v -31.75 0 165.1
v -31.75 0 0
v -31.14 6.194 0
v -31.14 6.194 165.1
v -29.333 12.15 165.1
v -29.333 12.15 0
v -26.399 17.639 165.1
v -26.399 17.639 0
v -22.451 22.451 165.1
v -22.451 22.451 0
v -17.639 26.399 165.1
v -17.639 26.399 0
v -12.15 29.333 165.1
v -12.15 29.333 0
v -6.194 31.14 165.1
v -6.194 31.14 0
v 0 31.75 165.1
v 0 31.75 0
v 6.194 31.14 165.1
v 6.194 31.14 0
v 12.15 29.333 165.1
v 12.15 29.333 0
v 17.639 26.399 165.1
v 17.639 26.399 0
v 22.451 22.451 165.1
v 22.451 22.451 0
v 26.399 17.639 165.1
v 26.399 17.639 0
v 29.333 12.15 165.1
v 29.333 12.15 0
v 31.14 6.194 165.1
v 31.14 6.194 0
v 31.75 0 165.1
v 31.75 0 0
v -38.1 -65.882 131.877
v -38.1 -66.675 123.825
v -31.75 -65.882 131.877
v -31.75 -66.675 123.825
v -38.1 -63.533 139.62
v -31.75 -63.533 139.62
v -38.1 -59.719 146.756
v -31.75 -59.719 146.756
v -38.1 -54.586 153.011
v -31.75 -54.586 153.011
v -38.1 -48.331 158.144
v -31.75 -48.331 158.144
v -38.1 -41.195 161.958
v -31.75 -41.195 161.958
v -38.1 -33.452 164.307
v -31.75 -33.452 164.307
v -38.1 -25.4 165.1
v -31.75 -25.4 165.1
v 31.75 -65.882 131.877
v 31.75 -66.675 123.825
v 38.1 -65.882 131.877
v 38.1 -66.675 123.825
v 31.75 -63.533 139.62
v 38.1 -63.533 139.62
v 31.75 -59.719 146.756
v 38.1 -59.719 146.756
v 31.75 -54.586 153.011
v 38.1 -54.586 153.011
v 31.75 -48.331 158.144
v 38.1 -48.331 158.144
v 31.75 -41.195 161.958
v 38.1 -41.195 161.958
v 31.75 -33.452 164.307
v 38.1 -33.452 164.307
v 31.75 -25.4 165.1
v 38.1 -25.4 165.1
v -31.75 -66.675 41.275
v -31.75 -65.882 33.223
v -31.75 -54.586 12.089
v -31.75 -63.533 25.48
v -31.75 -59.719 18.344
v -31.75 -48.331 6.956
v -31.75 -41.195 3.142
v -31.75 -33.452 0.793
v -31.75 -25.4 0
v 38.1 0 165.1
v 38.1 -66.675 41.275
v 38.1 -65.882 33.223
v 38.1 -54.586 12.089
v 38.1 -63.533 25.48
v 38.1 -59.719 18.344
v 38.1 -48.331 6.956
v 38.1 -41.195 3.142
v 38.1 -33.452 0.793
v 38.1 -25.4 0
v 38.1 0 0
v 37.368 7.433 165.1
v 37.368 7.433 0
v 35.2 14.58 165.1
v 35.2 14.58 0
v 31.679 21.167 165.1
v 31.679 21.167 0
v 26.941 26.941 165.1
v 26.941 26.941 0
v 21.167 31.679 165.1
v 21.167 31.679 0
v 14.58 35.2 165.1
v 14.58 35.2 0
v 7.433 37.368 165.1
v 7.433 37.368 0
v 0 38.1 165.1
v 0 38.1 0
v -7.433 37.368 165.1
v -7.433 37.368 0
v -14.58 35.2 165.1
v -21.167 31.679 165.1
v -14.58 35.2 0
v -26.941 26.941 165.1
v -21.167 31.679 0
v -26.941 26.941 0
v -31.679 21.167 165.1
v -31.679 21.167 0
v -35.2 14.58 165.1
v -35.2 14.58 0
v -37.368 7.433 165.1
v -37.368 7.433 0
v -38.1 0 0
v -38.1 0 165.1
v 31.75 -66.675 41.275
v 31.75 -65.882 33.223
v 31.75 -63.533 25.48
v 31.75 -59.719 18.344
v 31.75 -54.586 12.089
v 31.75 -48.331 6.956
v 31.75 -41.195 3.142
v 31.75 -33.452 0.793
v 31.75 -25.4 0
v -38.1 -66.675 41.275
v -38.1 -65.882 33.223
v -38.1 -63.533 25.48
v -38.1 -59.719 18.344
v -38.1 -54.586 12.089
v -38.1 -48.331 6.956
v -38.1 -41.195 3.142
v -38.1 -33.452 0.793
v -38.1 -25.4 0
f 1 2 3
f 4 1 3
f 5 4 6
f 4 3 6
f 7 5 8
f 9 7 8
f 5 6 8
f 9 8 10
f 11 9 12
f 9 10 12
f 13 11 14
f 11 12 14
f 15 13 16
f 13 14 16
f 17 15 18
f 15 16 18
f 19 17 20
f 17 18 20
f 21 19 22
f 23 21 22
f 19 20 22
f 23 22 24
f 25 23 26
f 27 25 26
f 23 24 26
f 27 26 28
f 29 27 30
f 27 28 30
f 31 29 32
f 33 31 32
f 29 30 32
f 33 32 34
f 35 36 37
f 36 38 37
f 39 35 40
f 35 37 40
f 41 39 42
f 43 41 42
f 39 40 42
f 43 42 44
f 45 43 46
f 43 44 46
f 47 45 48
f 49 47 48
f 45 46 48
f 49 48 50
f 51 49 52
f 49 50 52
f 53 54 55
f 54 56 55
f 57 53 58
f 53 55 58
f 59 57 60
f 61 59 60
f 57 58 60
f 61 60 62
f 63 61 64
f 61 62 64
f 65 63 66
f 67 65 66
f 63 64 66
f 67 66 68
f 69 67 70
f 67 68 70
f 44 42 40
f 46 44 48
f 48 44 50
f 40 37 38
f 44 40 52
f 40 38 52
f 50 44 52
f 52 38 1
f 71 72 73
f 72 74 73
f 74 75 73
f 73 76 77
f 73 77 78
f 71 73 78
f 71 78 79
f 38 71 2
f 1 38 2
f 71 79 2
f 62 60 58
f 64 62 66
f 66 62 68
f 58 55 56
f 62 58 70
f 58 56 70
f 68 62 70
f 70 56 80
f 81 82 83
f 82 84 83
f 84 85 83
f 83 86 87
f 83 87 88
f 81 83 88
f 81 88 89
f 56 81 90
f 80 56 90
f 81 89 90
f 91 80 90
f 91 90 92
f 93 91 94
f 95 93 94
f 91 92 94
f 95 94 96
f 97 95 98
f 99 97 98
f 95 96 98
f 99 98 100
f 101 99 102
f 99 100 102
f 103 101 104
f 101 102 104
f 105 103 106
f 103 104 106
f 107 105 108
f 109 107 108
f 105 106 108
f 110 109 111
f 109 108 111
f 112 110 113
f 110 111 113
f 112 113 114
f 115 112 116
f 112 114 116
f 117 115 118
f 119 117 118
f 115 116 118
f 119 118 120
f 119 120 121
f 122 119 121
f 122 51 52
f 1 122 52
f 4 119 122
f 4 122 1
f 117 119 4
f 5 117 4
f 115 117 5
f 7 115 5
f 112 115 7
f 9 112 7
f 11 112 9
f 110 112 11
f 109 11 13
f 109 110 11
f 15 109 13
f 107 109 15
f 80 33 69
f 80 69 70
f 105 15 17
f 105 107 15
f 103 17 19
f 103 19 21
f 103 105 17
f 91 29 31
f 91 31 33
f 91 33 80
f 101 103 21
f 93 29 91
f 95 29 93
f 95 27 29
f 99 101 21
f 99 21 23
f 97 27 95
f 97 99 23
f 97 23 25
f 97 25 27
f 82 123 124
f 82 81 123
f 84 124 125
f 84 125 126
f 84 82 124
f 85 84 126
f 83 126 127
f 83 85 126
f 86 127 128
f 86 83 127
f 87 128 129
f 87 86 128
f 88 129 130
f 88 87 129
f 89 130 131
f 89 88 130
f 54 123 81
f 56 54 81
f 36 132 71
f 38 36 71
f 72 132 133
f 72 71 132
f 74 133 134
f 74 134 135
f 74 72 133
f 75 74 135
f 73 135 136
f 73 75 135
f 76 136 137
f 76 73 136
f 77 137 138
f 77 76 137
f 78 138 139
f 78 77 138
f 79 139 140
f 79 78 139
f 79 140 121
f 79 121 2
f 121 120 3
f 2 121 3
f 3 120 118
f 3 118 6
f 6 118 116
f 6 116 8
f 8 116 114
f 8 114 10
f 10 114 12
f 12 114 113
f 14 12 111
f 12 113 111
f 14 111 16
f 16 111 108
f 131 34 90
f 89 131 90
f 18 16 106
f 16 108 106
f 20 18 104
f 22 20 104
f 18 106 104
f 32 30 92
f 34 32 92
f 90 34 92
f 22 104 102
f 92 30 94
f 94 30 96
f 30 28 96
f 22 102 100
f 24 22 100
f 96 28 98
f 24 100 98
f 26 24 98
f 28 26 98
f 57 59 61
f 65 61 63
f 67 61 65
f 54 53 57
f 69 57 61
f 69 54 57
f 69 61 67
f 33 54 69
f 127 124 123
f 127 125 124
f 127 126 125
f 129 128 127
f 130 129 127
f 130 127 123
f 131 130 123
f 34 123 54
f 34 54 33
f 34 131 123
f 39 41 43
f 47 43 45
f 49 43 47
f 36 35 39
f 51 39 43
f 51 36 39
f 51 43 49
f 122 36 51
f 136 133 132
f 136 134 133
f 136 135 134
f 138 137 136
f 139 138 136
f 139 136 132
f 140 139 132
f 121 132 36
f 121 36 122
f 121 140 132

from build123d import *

# Parameters (mm, degrees)
F0_W     = 6.35
F0_H     = 66.675
F1_DEPTH = 165.1
F2_R     = 41.275


with BuildPart() as f1:
    # F0 (on Top) → F1 (new body)
    with BuildSketch(Plane.XY):
        with BuildLine():
            Line((31.75, 0), (38.1, 0))
            ThreePointArc((38.1, 0), (0, 38.1), (-38.1, 0))
            Line((-38.1, 0), (-31.75, 0))
            ThreePointArc((-31.75, 0), (0, 31.75), (31.75, 0))
        make_face()
        with Locations((-34.925, -33.3375)):
            Rectangle(F0_W, F0_H)
        with Locations((34.925, -33.3375)):
            Rectangle(F0_W, F0_H)
    extrude(amount=F1_DEPTH)

    # F2
    f2_edges = [f1.edges().sort_by_distance(p)[0] for p in [
        (-34.925, -66.675, 165.1),
        (34.925, -66.675, 165.1),
        (-34.925, -66.675, 0),
        (34.925, -66.675, 0),
    ]]
    fillet(f2_edges, radius=F2_R)


solid = f1.part
